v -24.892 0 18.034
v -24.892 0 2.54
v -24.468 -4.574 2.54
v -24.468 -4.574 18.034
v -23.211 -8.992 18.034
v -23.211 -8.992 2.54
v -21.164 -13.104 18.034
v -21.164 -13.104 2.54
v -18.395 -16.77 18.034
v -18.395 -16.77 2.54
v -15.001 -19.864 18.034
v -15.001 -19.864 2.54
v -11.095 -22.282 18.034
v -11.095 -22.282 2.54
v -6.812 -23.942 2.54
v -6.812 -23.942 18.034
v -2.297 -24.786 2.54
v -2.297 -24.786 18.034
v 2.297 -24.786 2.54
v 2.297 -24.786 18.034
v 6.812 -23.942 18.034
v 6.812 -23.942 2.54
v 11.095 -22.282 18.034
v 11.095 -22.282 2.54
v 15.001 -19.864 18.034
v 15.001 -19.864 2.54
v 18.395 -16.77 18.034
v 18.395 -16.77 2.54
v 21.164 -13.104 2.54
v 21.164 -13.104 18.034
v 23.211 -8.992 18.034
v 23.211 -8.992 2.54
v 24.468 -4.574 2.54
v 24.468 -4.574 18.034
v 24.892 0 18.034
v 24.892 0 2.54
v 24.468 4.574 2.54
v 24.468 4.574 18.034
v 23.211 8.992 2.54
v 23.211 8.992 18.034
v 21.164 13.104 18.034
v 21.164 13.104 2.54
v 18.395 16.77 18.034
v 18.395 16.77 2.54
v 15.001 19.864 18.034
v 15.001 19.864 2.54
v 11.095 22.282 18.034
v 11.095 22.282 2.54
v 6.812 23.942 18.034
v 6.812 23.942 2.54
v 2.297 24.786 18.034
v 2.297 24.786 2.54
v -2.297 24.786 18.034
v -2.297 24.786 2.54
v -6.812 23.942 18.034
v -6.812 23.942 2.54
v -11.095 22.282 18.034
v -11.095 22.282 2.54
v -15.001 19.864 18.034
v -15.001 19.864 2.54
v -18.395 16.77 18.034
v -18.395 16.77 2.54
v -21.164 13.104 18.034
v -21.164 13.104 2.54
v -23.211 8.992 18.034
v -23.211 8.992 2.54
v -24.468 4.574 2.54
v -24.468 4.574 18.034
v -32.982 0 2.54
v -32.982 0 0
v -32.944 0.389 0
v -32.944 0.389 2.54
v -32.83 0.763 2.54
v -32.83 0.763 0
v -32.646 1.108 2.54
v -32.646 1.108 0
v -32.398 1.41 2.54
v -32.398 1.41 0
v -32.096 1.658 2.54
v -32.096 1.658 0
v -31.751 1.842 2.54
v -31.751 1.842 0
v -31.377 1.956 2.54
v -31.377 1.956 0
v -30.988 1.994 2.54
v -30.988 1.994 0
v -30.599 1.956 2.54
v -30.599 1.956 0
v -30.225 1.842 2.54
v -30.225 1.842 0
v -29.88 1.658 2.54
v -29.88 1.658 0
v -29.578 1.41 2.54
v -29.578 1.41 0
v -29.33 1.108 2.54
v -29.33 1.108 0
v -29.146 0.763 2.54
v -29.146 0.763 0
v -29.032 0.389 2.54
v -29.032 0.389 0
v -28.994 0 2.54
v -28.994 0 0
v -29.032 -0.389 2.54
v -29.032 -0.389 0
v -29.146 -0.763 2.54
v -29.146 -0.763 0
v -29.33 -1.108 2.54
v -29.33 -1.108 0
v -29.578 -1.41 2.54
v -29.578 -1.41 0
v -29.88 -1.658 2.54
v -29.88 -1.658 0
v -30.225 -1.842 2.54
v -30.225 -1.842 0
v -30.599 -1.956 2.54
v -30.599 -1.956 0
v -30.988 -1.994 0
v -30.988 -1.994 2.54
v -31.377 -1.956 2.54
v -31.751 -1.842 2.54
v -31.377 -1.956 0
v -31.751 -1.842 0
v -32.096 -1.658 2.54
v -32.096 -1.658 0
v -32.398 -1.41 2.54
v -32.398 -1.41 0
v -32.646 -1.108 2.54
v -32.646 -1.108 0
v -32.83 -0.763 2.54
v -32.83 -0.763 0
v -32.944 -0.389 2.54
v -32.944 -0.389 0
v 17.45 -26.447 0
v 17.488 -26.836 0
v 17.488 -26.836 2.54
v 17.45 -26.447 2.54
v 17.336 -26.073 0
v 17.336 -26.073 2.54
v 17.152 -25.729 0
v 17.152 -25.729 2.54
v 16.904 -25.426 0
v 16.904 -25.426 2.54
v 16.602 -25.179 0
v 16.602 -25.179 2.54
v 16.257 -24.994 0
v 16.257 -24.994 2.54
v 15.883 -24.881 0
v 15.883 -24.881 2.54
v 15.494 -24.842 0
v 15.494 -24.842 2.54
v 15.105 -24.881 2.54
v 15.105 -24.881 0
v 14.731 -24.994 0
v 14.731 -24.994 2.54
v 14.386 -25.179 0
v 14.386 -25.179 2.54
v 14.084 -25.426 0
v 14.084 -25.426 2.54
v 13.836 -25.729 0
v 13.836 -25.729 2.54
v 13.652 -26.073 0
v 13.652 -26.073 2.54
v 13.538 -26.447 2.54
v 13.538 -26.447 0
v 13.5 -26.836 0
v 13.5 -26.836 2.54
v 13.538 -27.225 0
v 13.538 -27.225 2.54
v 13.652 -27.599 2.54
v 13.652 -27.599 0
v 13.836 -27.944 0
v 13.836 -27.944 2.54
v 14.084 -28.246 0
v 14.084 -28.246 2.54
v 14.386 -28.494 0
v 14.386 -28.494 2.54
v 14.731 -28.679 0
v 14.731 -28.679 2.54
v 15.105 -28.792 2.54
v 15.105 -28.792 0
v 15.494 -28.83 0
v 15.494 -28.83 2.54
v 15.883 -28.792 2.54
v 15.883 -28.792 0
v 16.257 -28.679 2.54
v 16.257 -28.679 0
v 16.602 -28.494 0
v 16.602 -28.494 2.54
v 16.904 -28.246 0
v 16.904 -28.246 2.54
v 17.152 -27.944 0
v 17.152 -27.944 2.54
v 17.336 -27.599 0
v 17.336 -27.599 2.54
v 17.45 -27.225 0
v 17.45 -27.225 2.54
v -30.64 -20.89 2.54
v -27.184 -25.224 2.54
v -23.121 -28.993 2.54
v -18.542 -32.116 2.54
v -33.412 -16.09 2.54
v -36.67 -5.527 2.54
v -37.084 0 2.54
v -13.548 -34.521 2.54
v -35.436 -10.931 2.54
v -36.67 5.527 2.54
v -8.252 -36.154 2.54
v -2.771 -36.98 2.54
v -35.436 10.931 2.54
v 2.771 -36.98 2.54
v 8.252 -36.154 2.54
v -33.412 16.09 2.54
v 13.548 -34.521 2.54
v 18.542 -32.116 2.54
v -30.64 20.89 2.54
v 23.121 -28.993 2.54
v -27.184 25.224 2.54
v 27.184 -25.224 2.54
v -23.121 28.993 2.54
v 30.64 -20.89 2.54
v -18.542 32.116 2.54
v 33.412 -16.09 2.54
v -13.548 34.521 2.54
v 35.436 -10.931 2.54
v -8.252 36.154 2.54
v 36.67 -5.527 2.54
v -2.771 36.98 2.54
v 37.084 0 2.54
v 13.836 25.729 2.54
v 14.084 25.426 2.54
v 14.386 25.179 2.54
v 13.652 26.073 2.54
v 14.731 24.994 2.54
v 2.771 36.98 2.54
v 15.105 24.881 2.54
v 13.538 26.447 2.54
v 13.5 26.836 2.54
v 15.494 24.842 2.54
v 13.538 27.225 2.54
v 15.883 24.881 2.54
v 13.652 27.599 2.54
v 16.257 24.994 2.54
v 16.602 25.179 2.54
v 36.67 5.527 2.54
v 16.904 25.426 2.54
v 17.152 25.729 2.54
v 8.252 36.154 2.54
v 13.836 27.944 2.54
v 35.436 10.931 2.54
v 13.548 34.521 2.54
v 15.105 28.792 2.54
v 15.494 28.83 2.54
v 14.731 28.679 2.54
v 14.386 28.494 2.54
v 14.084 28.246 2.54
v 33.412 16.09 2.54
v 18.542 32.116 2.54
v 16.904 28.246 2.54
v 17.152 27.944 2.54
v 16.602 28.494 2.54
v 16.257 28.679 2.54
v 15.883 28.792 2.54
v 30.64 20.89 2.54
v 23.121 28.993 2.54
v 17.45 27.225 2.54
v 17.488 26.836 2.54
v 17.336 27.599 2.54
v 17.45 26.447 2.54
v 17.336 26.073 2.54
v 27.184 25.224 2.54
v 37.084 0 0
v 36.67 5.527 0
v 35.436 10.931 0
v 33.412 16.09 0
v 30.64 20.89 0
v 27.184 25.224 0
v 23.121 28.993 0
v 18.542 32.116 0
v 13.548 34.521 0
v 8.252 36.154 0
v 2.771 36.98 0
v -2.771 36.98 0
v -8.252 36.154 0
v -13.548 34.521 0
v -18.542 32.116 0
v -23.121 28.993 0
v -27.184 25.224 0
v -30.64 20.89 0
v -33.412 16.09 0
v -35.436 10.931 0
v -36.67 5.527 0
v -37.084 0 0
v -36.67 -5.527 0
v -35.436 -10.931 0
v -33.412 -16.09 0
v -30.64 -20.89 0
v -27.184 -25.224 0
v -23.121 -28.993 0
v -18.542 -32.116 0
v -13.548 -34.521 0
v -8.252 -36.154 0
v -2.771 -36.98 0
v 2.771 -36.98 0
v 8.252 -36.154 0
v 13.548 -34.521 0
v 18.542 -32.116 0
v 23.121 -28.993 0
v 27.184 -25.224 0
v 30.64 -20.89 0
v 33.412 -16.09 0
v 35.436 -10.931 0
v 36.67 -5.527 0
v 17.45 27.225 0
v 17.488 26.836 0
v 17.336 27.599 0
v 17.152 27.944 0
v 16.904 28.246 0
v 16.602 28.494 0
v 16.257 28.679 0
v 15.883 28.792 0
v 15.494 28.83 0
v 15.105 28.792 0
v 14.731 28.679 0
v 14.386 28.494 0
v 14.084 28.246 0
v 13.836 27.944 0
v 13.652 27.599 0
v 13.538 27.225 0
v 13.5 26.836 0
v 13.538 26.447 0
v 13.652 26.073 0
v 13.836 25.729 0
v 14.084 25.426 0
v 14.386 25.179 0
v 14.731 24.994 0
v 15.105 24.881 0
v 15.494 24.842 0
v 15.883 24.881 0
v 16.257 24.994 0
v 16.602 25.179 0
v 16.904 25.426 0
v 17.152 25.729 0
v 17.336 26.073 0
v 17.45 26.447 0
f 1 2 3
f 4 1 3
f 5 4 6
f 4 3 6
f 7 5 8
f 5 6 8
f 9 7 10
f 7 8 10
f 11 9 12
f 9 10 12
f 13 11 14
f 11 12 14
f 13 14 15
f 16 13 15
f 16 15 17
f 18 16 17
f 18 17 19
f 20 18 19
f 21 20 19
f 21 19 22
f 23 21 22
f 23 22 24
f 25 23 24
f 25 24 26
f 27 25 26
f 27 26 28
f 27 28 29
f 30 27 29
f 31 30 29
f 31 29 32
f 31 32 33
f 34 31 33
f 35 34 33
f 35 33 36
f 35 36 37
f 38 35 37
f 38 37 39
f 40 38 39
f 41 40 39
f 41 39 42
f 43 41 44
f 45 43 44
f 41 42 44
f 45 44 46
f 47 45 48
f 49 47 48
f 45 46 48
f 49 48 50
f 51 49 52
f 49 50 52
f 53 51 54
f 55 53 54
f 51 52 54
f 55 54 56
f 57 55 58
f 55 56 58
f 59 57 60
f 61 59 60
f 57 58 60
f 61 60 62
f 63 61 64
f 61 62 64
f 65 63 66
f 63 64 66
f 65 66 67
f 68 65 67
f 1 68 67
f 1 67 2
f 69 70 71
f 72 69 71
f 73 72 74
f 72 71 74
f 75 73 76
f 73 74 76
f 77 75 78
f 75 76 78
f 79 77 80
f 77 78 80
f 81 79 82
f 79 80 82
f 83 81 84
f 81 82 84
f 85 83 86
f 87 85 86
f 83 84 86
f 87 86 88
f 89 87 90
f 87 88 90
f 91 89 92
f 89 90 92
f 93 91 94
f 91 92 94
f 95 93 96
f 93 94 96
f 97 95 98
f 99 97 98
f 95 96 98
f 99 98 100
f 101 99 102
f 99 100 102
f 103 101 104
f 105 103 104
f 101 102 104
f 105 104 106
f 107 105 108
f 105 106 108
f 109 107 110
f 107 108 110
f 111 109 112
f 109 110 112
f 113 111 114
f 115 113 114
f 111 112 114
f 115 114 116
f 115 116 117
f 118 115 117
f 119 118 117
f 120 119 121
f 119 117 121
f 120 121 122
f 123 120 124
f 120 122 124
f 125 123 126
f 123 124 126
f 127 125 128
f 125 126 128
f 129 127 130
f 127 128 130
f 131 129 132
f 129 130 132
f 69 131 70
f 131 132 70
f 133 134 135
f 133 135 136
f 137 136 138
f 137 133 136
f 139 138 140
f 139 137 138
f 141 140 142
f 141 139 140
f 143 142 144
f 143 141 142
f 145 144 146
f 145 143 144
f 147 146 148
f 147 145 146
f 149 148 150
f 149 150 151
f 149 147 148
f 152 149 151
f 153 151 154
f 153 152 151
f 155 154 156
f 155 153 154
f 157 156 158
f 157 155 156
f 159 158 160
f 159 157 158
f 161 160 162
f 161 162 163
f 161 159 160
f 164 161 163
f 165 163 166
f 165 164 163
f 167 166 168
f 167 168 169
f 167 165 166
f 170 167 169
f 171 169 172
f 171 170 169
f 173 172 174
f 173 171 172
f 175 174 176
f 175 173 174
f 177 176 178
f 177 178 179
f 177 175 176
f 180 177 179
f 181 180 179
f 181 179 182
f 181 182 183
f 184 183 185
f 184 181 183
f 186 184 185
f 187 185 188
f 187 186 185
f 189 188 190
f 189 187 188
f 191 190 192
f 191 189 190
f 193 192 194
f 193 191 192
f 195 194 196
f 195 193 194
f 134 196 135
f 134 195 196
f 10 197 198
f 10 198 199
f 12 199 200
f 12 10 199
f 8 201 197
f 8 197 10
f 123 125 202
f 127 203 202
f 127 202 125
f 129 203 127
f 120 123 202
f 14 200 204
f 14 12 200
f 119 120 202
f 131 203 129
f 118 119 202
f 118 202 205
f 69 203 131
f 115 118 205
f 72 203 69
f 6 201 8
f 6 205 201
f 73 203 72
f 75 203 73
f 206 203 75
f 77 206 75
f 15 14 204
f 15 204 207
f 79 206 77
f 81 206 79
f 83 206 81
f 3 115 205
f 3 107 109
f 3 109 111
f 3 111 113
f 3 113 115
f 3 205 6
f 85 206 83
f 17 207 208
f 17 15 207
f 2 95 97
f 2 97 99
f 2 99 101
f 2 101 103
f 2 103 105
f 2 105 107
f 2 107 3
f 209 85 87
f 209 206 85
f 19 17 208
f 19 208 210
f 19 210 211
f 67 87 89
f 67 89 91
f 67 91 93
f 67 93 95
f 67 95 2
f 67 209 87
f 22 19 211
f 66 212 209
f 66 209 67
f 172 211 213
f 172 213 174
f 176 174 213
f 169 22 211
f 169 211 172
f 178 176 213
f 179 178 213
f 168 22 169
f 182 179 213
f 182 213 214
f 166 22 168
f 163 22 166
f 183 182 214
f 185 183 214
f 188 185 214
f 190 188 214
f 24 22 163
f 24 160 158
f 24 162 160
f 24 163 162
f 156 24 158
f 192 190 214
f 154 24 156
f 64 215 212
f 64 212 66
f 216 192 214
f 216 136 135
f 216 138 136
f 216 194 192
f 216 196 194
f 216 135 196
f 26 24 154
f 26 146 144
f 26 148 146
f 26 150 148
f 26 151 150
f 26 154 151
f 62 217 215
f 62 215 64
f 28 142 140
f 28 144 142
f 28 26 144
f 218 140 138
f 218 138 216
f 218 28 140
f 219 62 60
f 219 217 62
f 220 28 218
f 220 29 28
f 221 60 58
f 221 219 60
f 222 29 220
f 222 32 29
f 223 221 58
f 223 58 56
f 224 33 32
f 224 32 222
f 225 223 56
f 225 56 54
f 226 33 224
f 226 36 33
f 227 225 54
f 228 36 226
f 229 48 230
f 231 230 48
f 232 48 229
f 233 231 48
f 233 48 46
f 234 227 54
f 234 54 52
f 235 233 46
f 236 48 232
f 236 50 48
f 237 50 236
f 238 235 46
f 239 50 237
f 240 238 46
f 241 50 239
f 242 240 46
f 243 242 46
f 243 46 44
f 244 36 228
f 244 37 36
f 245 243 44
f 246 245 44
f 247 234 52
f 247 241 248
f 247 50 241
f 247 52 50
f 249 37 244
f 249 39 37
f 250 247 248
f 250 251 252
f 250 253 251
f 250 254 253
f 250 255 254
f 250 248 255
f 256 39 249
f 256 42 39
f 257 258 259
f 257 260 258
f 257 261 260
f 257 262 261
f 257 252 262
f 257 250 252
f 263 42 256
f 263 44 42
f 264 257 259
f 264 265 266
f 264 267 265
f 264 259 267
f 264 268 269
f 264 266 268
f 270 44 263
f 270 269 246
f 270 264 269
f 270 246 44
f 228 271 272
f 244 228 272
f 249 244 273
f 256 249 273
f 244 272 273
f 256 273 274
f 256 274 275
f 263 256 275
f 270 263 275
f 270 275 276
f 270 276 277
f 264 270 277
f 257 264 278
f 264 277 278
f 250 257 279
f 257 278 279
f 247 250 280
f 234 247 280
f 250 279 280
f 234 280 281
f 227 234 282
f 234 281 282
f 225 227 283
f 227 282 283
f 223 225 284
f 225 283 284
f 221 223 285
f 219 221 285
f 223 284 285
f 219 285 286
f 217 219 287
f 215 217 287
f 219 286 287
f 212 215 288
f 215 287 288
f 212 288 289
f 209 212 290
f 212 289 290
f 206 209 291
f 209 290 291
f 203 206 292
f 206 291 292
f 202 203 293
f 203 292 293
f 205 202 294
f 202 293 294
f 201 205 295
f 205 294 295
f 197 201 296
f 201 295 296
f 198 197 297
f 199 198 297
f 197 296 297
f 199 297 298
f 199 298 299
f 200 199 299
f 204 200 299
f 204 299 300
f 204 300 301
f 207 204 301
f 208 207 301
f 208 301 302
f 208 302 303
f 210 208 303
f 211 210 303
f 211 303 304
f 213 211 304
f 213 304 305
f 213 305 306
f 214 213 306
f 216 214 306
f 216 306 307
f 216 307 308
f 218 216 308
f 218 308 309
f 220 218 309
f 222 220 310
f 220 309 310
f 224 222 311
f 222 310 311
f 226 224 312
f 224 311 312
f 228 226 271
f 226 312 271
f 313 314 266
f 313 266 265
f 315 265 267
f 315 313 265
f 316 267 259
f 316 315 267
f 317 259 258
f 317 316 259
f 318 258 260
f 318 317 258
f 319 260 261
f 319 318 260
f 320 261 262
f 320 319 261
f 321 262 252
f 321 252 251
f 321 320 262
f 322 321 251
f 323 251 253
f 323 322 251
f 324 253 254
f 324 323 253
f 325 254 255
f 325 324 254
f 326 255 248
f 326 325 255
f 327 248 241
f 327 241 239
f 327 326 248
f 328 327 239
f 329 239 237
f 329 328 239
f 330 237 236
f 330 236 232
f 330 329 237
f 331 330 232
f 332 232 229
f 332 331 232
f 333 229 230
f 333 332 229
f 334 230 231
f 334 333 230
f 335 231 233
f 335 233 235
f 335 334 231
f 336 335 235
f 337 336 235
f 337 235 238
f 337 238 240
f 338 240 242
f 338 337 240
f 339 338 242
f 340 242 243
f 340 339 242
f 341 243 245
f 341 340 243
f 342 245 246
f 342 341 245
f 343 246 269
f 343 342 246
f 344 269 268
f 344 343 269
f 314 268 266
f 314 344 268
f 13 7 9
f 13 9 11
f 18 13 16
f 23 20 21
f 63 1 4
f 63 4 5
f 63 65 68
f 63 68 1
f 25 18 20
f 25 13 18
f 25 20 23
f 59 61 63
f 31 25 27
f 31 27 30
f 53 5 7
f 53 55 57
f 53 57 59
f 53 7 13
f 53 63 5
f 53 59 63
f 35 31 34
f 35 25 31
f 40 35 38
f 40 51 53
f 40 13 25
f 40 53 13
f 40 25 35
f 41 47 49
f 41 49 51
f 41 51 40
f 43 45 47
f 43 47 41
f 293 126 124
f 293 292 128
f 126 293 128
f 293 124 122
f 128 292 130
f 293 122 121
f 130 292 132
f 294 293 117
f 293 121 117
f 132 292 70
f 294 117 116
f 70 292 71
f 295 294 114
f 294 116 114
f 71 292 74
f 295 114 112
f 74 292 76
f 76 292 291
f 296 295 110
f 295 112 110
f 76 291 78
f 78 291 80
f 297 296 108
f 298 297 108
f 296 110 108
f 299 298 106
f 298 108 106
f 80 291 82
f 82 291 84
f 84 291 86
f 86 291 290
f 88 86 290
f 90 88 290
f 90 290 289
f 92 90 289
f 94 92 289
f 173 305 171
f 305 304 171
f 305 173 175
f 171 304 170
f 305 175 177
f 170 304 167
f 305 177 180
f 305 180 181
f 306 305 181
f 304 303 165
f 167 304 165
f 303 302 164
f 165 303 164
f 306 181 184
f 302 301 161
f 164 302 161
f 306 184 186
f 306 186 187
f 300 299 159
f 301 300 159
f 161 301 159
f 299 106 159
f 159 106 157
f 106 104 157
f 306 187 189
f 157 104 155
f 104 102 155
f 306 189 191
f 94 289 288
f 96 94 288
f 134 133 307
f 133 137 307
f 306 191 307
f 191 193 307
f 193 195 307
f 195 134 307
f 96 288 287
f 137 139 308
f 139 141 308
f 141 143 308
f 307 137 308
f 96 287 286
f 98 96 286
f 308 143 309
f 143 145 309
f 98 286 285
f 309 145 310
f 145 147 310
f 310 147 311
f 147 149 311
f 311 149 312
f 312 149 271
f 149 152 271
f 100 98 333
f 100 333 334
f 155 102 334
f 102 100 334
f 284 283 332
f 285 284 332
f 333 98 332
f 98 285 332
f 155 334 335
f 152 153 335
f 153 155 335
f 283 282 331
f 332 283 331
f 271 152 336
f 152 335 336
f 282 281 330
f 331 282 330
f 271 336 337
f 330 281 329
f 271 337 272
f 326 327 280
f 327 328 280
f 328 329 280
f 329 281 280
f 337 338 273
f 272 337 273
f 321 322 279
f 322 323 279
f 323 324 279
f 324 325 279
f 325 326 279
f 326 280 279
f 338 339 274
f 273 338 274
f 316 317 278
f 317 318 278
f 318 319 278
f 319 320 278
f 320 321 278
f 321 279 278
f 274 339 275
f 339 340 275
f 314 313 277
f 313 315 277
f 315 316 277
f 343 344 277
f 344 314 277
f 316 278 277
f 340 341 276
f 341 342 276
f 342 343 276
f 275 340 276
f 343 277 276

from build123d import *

# Parameters (mm, degrees)
F1_DEPTH = 18.034
F0_R     = 1.9939
F2_DEPTH = 2.54


# Not quite as in the source:
# - a feature names something its author has since deleted; it is built from what else it names


with BuildPart() as f1:
    # F0 (on Top) → F1 (new body)
    with BuildSketch(Plane.XY):
        with BuildLine():
            ThreePointArc((24.892, 0), (0, 24.892), (-24.892, 0))
            ThreePointArc((-24.892, 0), (0, -24.892), (24.892, 0))
        make_face()
    extrude(amount=F1_DEPTH)

    # F0 (on Top) → F2 (join)
    with BuildSketch(Plane.XY):
        with BuildLine():
            ThreePointArc((-37.084, 0), (0, -37.084), (37.084, 0))
            ThreePointArc((37.084, 0), (0, 37.084), (-37.084, 0))
        make_face()
        with Locations((15.494, -26.8363952125)):
            Circle(F0_R, mode=Mode.SUBTRACT)
        with BuildLine():
            ThreePointArc((-28.9941, 0), (-30.988, -1.9939), (-32.9819, 0))
            ThreePointArc((-32.9819, 0), (-30.988, 1.9939), (-28.9941, 0))
        make_face(mode=Mode.SUBTRACT)
        with BuildLine():
            ThreePointArc((24.892, 0), (0, -24.892), (-24.892, 0))
            ThreePointArc((-24.892, 0), (0, 24.892), (24.892, 0))
        make_face(mode=Mode.SUBTRACT)
        with Locations((15.494, 26.8363952125)):
            Circle(F0_R, mode=Mode.SUBTRACT)
    extrude(amount=F2_DEPTH)


solid = f1.part
